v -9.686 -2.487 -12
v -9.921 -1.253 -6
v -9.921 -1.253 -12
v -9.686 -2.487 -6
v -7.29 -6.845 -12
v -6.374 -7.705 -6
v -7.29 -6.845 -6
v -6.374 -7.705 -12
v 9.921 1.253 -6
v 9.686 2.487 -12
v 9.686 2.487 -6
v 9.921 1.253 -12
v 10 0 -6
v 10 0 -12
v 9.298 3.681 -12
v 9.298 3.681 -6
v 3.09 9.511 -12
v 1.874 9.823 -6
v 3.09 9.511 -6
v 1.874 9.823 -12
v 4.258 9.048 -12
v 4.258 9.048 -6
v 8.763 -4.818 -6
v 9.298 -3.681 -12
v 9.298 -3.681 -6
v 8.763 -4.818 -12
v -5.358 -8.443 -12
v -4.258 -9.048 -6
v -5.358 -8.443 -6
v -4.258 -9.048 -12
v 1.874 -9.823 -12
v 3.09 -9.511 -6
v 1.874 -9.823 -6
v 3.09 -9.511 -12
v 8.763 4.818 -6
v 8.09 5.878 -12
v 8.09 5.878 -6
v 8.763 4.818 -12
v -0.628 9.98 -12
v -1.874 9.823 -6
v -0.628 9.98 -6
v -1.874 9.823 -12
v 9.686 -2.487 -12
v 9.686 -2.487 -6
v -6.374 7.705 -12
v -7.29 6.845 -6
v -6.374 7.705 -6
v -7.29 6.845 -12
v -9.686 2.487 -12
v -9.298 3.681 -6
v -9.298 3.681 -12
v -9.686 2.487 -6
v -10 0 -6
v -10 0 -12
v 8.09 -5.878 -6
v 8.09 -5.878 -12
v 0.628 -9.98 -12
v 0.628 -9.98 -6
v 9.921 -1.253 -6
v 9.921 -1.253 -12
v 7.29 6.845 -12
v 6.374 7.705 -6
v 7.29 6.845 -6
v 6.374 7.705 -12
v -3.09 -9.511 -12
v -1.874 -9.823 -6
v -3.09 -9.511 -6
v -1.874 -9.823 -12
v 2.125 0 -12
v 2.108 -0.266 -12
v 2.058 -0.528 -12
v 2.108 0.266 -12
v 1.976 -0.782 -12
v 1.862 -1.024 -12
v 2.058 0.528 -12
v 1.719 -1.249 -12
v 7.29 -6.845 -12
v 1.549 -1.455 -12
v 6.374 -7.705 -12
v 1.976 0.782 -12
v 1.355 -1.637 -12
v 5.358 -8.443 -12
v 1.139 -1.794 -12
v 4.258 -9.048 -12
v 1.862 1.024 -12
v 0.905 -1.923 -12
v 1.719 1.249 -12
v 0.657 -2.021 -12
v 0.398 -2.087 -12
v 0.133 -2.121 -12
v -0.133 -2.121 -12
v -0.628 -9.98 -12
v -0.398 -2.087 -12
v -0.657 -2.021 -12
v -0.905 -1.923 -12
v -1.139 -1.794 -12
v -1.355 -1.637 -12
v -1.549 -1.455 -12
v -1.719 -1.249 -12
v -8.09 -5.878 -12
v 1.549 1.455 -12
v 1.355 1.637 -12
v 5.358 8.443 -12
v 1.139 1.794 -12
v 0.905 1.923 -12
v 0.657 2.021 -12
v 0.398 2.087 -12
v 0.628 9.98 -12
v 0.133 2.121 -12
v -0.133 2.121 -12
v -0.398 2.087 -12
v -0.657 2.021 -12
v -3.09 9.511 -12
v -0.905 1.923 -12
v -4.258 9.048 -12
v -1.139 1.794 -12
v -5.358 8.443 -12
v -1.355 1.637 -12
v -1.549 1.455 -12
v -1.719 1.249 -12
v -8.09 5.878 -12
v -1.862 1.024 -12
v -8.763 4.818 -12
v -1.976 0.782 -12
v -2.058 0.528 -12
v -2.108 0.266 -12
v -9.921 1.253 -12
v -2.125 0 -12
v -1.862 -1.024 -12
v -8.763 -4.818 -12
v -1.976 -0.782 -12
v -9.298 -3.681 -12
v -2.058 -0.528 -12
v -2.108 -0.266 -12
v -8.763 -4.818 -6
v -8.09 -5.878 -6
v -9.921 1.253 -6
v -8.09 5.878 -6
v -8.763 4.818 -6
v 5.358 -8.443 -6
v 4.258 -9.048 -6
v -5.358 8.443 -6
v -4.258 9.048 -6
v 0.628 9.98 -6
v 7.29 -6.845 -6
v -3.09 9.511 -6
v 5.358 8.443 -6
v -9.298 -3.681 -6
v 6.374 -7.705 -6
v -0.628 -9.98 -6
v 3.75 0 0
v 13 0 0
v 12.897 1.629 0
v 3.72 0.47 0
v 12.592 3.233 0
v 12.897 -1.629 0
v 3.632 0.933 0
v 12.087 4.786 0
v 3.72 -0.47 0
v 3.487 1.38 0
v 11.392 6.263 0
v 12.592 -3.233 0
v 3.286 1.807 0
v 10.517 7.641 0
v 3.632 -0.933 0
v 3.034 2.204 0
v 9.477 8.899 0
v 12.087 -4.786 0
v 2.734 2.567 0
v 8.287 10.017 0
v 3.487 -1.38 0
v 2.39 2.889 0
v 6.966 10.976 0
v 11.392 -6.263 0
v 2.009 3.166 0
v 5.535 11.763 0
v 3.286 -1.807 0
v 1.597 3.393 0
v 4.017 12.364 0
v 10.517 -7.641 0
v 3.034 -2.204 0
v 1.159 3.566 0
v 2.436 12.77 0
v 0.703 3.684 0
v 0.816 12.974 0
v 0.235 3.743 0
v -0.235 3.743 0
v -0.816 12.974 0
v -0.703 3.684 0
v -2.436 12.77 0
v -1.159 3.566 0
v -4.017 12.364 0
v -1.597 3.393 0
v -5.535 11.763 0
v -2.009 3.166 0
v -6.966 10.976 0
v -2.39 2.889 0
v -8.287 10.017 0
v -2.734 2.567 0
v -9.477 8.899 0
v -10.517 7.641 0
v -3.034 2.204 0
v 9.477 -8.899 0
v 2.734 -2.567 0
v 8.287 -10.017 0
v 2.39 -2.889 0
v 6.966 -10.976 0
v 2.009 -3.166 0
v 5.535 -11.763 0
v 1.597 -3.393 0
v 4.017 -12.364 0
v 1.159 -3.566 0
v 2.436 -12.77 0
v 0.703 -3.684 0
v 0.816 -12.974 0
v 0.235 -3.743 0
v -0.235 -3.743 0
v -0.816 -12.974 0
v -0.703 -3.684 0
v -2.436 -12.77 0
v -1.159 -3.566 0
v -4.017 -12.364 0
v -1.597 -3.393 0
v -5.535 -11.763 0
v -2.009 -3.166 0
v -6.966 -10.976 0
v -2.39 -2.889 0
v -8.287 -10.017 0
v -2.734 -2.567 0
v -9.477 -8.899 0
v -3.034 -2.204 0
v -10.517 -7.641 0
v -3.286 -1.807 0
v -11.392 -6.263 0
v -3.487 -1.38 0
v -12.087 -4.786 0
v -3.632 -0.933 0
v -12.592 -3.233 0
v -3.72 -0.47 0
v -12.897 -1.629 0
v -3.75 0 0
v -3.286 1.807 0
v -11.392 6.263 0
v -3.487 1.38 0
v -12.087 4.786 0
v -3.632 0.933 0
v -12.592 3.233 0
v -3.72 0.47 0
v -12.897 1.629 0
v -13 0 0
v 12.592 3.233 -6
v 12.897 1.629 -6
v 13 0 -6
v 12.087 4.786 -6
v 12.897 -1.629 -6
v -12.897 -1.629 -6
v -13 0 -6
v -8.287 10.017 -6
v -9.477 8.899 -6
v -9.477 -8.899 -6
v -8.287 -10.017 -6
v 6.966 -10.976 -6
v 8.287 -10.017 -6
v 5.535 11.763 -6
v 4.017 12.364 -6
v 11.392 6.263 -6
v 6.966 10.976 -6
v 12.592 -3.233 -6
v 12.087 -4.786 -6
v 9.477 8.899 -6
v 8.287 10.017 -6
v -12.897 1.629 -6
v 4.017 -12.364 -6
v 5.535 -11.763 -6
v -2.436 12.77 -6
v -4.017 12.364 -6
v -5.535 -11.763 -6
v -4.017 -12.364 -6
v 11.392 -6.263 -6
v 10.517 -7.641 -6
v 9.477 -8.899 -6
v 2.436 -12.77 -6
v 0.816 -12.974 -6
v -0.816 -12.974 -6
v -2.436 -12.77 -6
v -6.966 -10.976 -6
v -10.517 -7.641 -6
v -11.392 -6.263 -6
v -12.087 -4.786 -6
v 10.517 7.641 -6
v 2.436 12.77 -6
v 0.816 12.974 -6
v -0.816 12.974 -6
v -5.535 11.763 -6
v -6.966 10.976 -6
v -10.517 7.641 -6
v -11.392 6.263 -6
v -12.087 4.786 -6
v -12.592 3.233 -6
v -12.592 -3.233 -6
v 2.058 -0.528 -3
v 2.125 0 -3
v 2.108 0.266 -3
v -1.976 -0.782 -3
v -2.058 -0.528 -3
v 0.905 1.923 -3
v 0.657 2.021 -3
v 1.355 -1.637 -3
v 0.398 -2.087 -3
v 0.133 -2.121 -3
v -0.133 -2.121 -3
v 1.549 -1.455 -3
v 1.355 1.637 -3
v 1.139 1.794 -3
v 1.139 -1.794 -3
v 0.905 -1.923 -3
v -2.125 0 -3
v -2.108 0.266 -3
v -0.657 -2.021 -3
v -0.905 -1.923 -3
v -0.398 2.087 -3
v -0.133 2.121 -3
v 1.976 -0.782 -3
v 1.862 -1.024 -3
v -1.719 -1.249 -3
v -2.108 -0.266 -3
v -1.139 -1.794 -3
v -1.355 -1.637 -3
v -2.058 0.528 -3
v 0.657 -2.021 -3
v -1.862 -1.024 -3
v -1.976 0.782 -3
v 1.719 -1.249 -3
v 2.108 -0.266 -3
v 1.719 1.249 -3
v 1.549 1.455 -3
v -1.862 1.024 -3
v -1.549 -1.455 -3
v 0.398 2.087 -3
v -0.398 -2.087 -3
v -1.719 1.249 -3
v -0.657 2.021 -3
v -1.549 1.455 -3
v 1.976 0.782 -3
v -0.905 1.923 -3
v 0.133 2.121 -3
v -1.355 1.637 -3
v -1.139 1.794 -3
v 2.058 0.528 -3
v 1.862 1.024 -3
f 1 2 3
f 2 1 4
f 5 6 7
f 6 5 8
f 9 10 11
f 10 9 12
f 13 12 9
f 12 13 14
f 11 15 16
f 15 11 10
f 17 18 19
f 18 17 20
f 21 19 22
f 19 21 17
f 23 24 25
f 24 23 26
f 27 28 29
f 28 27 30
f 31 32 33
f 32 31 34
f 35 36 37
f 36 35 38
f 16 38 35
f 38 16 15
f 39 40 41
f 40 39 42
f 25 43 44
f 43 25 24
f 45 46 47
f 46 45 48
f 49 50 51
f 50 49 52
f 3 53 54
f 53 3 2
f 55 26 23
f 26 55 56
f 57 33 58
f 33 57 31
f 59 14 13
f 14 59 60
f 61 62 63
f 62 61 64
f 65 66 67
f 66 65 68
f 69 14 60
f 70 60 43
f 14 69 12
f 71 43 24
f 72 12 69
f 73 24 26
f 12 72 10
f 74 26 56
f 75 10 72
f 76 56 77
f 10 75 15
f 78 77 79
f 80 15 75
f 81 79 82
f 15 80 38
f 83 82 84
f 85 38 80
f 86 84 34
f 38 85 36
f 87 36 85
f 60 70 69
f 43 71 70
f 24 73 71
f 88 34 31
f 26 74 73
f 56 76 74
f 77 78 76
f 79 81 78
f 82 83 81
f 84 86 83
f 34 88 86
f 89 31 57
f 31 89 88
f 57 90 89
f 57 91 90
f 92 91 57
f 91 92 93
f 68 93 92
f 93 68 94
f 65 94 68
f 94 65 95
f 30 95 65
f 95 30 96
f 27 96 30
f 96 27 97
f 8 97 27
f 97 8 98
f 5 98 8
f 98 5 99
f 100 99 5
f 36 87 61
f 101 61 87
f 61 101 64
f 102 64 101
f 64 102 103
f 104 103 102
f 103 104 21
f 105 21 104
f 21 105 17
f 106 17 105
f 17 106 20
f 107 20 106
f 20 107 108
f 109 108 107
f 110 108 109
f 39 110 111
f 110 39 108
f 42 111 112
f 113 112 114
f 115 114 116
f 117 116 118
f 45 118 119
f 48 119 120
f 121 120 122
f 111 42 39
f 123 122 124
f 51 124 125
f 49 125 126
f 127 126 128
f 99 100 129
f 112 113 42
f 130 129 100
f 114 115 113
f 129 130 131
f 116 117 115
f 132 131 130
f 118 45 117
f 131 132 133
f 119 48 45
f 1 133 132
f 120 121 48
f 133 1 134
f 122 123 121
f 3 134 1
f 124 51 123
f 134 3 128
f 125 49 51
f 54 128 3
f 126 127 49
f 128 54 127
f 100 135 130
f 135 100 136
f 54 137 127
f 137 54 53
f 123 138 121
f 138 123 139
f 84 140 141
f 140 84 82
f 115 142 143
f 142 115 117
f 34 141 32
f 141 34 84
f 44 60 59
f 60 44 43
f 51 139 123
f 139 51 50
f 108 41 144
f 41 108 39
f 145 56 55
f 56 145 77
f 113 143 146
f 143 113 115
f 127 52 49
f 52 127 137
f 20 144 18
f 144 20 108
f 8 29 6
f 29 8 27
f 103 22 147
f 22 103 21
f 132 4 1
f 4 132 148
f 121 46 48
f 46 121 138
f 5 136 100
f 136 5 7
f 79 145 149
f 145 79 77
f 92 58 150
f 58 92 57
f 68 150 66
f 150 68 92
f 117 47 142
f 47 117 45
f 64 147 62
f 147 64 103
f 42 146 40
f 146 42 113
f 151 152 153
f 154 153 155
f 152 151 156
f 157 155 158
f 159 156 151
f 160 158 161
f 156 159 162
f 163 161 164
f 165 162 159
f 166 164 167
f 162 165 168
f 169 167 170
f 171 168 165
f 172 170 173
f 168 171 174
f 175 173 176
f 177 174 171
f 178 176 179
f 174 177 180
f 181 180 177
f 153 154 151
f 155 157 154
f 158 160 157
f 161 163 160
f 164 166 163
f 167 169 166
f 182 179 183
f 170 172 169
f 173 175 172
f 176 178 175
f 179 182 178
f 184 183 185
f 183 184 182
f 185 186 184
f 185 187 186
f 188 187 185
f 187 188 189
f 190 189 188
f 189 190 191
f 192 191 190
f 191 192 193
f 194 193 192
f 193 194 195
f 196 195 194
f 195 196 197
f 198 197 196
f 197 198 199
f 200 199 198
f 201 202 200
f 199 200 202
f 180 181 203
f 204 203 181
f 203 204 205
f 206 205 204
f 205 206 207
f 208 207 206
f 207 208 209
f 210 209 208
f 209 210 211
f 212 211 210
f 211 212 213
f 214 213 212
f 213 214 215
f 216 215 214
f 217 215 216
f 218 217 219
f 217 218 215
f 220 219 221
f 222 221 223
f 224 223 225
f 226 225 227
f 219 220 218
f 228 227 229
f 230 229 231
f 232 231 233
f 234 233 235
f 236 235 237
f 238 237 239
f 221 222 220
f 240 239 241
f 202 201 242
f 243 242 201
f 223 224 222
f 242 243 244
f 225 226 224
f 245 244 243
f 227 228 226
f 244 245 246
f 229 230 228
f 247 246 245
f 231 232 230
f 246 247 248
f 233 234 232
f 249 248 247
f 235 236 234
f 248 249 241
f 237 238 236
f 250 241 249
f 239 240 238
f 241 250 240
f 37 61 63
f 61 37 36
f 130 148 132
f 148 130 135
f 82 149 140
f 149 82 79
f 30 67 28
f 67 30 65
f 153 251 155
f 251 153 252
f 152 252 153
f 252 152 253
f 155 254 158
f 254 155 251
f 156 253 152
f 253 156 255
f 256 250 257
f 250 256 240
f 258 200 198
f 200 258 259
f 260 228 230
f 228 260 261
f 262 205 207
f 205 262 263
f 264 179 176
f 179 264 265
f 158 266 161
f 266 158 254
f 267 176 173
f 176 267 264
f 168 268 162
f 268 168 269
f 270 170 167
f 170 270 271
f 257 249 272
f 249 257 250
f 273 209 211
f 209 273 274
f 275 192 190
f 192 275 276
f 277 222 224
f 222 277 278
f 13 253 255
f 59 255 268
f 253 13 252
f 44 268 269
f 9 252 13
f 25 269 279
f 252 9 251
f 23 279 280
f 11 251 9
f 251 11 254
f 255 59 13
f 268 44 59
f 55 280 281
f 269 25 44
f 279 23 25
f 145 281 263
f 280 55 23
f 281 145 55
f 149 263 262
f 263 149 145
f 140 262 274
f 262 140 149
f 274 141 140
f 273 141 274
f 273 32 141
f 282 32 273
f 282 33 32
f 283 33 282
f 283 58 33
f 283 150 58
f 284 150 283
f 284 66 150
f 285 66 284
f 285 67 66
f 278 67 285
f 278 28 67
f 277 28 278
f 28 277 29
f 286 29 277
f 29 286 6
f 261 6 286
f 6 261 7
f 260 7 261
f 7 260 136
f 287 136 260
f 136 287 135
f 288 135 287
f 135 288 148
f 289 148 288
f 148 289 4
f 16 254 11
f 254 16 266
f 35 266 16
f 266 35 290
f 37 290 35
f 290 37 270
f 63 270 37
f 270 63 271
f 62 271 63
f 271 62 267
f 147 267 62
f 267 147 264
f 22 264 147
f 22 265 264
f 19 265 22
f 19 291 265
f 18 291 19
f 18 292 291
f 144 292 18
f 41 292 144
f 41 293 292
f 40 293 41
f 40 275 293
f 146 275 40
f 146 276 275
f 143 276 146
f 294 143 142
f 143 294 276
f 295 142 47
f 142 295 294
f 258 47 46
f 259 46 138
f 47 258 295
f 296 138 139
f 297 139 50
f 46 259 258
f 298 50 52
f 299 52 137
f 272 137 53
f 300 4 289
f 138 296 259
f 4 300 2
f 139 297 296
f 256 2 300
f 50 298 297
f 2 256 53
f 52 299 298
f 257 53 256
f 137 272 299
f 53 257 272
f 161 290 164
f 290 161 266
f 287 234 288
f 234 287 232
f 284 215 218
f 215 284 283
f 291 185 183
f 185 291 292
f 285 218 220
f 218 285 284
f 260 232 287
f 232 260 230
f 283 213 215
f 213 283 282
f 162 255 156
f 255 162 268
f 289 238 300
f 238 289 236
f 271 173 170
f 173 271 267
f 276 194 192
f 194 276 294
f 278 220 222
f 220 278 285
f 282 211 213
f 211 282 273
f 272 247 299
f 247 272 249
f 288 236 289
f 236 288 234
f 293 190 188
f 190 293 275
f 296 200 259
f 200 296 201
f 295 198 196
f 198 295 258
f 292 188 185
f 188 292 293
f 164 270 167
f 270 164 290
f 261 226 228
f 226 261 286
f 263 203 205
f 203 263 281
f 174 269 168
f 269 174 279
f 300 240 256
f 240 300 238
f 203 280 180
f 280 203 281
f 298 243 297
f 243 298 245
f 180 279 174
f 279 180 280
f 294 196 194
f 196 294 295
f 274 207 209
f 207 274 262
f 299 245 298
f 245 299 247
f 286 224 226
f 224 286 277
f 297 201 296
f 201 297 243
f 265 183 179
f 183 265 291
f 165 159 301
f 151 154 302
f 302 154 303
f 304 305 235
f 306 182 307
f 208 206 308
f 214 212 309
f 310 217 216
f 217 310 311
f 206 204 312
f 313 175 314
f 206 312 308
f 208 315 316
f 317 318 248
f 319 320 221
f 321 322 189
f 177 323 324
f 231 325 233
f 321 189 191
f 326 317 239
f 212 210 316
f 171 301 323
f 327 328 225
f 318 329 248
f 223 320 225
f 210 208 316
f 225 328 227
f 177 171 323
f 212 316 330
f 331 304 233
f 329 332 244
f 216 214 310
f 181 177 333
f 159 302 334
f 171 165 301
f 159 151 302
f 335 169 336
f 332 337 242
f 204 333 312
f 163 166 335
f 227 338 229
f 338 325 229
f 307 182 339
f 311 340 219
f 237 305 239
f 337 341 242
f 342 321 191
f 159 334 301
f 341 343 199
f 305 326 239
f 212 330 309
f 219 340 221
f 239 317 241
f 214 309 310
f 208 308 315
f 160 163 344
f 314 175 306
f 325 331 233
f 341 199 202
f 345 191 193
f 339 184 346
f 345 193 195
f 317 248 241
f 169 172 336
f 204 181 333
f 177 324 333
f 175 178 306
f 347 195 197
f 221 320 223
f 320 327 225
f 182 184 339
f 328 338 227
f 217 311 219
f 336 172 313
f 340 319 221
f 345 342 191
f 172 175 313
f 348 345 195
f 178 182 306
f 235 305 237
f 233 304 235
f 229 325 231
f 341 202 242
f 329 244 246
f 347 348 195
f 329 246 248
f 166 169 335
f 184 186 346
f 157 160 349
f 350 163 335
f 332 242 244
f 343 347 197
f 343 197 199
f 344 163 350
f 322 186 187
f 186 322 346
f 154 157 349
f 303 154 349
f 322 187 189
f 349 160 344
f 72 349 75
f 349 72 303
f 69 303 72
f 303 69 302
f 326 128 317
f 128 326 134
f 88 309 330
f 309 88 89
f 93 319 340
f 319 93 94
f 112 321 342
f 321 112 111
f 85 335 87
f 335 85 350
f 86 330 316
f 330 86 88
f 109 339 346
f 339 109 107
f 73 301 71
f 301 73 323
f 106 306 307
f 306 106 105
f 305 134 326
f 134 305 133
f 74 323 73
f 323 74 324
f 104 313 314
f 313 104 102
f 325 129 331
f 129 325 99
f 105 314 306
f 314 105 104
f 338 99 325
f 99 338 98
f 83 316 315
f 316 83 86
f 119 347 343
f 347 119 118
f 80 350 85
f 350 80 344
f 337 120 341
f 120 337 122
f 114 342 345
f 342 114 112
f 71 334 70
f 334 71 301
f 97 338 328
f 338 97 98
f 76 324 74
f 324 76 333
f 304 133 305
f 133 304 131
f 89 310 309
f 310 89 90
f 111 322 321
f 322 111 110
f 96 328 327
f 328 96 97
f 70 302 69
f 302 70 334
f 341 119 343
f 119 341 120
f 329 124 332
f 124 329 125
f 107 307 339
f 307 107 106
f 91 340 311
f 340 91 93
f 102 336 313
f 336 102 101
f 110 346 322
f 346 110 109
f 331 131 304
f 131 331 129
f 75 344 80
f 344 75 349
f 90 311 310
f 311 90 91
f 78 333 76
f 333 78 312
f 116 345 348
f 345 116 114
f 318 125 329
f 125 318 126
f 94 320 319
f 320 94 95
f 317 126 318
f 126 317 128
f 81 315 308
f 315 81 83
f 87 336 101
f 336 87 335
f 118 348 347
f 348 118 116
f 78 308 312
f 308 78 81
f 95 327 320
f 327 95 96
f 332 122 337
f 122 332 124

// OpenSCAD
$fn = 50;


difference() {
	union() {
		translate(v = [0, 0, -12.0000000000]) {
			cylinder(h = 12, r = 10.0000000000);
		}
		translate(v = [0, 0, -6.0000000000]) {
			cylinder(h = 6, r = 13.0000000000);
		}
	}
	union() {
		translate(v = [0, 0, 0]) {
			rotate(a = [0, 0, 0]) {
				difference() {
					union() {
						#translate(v = [0, 0, -12.0000000000]) {
							cylinder(h = 12, r = 2.0000000000);
						}
						#translate(v = [0, 0, -3]) {
							cylinder(h = 3, r = 10.0000000000, r1 = 2.1250000000, r2 = 3.7500000000);
						}
						#translate(v = [0, 0, -12.0000000000]) {
							cylinder(h = 12, r = 2.1250000000);
						}
						#translate(v = [0, 0, -12.0000000000]) {
							cylinder(h = 12, r = 2.0000000000);
						}
					}
					union();
				}
			}
		}
	}
}
